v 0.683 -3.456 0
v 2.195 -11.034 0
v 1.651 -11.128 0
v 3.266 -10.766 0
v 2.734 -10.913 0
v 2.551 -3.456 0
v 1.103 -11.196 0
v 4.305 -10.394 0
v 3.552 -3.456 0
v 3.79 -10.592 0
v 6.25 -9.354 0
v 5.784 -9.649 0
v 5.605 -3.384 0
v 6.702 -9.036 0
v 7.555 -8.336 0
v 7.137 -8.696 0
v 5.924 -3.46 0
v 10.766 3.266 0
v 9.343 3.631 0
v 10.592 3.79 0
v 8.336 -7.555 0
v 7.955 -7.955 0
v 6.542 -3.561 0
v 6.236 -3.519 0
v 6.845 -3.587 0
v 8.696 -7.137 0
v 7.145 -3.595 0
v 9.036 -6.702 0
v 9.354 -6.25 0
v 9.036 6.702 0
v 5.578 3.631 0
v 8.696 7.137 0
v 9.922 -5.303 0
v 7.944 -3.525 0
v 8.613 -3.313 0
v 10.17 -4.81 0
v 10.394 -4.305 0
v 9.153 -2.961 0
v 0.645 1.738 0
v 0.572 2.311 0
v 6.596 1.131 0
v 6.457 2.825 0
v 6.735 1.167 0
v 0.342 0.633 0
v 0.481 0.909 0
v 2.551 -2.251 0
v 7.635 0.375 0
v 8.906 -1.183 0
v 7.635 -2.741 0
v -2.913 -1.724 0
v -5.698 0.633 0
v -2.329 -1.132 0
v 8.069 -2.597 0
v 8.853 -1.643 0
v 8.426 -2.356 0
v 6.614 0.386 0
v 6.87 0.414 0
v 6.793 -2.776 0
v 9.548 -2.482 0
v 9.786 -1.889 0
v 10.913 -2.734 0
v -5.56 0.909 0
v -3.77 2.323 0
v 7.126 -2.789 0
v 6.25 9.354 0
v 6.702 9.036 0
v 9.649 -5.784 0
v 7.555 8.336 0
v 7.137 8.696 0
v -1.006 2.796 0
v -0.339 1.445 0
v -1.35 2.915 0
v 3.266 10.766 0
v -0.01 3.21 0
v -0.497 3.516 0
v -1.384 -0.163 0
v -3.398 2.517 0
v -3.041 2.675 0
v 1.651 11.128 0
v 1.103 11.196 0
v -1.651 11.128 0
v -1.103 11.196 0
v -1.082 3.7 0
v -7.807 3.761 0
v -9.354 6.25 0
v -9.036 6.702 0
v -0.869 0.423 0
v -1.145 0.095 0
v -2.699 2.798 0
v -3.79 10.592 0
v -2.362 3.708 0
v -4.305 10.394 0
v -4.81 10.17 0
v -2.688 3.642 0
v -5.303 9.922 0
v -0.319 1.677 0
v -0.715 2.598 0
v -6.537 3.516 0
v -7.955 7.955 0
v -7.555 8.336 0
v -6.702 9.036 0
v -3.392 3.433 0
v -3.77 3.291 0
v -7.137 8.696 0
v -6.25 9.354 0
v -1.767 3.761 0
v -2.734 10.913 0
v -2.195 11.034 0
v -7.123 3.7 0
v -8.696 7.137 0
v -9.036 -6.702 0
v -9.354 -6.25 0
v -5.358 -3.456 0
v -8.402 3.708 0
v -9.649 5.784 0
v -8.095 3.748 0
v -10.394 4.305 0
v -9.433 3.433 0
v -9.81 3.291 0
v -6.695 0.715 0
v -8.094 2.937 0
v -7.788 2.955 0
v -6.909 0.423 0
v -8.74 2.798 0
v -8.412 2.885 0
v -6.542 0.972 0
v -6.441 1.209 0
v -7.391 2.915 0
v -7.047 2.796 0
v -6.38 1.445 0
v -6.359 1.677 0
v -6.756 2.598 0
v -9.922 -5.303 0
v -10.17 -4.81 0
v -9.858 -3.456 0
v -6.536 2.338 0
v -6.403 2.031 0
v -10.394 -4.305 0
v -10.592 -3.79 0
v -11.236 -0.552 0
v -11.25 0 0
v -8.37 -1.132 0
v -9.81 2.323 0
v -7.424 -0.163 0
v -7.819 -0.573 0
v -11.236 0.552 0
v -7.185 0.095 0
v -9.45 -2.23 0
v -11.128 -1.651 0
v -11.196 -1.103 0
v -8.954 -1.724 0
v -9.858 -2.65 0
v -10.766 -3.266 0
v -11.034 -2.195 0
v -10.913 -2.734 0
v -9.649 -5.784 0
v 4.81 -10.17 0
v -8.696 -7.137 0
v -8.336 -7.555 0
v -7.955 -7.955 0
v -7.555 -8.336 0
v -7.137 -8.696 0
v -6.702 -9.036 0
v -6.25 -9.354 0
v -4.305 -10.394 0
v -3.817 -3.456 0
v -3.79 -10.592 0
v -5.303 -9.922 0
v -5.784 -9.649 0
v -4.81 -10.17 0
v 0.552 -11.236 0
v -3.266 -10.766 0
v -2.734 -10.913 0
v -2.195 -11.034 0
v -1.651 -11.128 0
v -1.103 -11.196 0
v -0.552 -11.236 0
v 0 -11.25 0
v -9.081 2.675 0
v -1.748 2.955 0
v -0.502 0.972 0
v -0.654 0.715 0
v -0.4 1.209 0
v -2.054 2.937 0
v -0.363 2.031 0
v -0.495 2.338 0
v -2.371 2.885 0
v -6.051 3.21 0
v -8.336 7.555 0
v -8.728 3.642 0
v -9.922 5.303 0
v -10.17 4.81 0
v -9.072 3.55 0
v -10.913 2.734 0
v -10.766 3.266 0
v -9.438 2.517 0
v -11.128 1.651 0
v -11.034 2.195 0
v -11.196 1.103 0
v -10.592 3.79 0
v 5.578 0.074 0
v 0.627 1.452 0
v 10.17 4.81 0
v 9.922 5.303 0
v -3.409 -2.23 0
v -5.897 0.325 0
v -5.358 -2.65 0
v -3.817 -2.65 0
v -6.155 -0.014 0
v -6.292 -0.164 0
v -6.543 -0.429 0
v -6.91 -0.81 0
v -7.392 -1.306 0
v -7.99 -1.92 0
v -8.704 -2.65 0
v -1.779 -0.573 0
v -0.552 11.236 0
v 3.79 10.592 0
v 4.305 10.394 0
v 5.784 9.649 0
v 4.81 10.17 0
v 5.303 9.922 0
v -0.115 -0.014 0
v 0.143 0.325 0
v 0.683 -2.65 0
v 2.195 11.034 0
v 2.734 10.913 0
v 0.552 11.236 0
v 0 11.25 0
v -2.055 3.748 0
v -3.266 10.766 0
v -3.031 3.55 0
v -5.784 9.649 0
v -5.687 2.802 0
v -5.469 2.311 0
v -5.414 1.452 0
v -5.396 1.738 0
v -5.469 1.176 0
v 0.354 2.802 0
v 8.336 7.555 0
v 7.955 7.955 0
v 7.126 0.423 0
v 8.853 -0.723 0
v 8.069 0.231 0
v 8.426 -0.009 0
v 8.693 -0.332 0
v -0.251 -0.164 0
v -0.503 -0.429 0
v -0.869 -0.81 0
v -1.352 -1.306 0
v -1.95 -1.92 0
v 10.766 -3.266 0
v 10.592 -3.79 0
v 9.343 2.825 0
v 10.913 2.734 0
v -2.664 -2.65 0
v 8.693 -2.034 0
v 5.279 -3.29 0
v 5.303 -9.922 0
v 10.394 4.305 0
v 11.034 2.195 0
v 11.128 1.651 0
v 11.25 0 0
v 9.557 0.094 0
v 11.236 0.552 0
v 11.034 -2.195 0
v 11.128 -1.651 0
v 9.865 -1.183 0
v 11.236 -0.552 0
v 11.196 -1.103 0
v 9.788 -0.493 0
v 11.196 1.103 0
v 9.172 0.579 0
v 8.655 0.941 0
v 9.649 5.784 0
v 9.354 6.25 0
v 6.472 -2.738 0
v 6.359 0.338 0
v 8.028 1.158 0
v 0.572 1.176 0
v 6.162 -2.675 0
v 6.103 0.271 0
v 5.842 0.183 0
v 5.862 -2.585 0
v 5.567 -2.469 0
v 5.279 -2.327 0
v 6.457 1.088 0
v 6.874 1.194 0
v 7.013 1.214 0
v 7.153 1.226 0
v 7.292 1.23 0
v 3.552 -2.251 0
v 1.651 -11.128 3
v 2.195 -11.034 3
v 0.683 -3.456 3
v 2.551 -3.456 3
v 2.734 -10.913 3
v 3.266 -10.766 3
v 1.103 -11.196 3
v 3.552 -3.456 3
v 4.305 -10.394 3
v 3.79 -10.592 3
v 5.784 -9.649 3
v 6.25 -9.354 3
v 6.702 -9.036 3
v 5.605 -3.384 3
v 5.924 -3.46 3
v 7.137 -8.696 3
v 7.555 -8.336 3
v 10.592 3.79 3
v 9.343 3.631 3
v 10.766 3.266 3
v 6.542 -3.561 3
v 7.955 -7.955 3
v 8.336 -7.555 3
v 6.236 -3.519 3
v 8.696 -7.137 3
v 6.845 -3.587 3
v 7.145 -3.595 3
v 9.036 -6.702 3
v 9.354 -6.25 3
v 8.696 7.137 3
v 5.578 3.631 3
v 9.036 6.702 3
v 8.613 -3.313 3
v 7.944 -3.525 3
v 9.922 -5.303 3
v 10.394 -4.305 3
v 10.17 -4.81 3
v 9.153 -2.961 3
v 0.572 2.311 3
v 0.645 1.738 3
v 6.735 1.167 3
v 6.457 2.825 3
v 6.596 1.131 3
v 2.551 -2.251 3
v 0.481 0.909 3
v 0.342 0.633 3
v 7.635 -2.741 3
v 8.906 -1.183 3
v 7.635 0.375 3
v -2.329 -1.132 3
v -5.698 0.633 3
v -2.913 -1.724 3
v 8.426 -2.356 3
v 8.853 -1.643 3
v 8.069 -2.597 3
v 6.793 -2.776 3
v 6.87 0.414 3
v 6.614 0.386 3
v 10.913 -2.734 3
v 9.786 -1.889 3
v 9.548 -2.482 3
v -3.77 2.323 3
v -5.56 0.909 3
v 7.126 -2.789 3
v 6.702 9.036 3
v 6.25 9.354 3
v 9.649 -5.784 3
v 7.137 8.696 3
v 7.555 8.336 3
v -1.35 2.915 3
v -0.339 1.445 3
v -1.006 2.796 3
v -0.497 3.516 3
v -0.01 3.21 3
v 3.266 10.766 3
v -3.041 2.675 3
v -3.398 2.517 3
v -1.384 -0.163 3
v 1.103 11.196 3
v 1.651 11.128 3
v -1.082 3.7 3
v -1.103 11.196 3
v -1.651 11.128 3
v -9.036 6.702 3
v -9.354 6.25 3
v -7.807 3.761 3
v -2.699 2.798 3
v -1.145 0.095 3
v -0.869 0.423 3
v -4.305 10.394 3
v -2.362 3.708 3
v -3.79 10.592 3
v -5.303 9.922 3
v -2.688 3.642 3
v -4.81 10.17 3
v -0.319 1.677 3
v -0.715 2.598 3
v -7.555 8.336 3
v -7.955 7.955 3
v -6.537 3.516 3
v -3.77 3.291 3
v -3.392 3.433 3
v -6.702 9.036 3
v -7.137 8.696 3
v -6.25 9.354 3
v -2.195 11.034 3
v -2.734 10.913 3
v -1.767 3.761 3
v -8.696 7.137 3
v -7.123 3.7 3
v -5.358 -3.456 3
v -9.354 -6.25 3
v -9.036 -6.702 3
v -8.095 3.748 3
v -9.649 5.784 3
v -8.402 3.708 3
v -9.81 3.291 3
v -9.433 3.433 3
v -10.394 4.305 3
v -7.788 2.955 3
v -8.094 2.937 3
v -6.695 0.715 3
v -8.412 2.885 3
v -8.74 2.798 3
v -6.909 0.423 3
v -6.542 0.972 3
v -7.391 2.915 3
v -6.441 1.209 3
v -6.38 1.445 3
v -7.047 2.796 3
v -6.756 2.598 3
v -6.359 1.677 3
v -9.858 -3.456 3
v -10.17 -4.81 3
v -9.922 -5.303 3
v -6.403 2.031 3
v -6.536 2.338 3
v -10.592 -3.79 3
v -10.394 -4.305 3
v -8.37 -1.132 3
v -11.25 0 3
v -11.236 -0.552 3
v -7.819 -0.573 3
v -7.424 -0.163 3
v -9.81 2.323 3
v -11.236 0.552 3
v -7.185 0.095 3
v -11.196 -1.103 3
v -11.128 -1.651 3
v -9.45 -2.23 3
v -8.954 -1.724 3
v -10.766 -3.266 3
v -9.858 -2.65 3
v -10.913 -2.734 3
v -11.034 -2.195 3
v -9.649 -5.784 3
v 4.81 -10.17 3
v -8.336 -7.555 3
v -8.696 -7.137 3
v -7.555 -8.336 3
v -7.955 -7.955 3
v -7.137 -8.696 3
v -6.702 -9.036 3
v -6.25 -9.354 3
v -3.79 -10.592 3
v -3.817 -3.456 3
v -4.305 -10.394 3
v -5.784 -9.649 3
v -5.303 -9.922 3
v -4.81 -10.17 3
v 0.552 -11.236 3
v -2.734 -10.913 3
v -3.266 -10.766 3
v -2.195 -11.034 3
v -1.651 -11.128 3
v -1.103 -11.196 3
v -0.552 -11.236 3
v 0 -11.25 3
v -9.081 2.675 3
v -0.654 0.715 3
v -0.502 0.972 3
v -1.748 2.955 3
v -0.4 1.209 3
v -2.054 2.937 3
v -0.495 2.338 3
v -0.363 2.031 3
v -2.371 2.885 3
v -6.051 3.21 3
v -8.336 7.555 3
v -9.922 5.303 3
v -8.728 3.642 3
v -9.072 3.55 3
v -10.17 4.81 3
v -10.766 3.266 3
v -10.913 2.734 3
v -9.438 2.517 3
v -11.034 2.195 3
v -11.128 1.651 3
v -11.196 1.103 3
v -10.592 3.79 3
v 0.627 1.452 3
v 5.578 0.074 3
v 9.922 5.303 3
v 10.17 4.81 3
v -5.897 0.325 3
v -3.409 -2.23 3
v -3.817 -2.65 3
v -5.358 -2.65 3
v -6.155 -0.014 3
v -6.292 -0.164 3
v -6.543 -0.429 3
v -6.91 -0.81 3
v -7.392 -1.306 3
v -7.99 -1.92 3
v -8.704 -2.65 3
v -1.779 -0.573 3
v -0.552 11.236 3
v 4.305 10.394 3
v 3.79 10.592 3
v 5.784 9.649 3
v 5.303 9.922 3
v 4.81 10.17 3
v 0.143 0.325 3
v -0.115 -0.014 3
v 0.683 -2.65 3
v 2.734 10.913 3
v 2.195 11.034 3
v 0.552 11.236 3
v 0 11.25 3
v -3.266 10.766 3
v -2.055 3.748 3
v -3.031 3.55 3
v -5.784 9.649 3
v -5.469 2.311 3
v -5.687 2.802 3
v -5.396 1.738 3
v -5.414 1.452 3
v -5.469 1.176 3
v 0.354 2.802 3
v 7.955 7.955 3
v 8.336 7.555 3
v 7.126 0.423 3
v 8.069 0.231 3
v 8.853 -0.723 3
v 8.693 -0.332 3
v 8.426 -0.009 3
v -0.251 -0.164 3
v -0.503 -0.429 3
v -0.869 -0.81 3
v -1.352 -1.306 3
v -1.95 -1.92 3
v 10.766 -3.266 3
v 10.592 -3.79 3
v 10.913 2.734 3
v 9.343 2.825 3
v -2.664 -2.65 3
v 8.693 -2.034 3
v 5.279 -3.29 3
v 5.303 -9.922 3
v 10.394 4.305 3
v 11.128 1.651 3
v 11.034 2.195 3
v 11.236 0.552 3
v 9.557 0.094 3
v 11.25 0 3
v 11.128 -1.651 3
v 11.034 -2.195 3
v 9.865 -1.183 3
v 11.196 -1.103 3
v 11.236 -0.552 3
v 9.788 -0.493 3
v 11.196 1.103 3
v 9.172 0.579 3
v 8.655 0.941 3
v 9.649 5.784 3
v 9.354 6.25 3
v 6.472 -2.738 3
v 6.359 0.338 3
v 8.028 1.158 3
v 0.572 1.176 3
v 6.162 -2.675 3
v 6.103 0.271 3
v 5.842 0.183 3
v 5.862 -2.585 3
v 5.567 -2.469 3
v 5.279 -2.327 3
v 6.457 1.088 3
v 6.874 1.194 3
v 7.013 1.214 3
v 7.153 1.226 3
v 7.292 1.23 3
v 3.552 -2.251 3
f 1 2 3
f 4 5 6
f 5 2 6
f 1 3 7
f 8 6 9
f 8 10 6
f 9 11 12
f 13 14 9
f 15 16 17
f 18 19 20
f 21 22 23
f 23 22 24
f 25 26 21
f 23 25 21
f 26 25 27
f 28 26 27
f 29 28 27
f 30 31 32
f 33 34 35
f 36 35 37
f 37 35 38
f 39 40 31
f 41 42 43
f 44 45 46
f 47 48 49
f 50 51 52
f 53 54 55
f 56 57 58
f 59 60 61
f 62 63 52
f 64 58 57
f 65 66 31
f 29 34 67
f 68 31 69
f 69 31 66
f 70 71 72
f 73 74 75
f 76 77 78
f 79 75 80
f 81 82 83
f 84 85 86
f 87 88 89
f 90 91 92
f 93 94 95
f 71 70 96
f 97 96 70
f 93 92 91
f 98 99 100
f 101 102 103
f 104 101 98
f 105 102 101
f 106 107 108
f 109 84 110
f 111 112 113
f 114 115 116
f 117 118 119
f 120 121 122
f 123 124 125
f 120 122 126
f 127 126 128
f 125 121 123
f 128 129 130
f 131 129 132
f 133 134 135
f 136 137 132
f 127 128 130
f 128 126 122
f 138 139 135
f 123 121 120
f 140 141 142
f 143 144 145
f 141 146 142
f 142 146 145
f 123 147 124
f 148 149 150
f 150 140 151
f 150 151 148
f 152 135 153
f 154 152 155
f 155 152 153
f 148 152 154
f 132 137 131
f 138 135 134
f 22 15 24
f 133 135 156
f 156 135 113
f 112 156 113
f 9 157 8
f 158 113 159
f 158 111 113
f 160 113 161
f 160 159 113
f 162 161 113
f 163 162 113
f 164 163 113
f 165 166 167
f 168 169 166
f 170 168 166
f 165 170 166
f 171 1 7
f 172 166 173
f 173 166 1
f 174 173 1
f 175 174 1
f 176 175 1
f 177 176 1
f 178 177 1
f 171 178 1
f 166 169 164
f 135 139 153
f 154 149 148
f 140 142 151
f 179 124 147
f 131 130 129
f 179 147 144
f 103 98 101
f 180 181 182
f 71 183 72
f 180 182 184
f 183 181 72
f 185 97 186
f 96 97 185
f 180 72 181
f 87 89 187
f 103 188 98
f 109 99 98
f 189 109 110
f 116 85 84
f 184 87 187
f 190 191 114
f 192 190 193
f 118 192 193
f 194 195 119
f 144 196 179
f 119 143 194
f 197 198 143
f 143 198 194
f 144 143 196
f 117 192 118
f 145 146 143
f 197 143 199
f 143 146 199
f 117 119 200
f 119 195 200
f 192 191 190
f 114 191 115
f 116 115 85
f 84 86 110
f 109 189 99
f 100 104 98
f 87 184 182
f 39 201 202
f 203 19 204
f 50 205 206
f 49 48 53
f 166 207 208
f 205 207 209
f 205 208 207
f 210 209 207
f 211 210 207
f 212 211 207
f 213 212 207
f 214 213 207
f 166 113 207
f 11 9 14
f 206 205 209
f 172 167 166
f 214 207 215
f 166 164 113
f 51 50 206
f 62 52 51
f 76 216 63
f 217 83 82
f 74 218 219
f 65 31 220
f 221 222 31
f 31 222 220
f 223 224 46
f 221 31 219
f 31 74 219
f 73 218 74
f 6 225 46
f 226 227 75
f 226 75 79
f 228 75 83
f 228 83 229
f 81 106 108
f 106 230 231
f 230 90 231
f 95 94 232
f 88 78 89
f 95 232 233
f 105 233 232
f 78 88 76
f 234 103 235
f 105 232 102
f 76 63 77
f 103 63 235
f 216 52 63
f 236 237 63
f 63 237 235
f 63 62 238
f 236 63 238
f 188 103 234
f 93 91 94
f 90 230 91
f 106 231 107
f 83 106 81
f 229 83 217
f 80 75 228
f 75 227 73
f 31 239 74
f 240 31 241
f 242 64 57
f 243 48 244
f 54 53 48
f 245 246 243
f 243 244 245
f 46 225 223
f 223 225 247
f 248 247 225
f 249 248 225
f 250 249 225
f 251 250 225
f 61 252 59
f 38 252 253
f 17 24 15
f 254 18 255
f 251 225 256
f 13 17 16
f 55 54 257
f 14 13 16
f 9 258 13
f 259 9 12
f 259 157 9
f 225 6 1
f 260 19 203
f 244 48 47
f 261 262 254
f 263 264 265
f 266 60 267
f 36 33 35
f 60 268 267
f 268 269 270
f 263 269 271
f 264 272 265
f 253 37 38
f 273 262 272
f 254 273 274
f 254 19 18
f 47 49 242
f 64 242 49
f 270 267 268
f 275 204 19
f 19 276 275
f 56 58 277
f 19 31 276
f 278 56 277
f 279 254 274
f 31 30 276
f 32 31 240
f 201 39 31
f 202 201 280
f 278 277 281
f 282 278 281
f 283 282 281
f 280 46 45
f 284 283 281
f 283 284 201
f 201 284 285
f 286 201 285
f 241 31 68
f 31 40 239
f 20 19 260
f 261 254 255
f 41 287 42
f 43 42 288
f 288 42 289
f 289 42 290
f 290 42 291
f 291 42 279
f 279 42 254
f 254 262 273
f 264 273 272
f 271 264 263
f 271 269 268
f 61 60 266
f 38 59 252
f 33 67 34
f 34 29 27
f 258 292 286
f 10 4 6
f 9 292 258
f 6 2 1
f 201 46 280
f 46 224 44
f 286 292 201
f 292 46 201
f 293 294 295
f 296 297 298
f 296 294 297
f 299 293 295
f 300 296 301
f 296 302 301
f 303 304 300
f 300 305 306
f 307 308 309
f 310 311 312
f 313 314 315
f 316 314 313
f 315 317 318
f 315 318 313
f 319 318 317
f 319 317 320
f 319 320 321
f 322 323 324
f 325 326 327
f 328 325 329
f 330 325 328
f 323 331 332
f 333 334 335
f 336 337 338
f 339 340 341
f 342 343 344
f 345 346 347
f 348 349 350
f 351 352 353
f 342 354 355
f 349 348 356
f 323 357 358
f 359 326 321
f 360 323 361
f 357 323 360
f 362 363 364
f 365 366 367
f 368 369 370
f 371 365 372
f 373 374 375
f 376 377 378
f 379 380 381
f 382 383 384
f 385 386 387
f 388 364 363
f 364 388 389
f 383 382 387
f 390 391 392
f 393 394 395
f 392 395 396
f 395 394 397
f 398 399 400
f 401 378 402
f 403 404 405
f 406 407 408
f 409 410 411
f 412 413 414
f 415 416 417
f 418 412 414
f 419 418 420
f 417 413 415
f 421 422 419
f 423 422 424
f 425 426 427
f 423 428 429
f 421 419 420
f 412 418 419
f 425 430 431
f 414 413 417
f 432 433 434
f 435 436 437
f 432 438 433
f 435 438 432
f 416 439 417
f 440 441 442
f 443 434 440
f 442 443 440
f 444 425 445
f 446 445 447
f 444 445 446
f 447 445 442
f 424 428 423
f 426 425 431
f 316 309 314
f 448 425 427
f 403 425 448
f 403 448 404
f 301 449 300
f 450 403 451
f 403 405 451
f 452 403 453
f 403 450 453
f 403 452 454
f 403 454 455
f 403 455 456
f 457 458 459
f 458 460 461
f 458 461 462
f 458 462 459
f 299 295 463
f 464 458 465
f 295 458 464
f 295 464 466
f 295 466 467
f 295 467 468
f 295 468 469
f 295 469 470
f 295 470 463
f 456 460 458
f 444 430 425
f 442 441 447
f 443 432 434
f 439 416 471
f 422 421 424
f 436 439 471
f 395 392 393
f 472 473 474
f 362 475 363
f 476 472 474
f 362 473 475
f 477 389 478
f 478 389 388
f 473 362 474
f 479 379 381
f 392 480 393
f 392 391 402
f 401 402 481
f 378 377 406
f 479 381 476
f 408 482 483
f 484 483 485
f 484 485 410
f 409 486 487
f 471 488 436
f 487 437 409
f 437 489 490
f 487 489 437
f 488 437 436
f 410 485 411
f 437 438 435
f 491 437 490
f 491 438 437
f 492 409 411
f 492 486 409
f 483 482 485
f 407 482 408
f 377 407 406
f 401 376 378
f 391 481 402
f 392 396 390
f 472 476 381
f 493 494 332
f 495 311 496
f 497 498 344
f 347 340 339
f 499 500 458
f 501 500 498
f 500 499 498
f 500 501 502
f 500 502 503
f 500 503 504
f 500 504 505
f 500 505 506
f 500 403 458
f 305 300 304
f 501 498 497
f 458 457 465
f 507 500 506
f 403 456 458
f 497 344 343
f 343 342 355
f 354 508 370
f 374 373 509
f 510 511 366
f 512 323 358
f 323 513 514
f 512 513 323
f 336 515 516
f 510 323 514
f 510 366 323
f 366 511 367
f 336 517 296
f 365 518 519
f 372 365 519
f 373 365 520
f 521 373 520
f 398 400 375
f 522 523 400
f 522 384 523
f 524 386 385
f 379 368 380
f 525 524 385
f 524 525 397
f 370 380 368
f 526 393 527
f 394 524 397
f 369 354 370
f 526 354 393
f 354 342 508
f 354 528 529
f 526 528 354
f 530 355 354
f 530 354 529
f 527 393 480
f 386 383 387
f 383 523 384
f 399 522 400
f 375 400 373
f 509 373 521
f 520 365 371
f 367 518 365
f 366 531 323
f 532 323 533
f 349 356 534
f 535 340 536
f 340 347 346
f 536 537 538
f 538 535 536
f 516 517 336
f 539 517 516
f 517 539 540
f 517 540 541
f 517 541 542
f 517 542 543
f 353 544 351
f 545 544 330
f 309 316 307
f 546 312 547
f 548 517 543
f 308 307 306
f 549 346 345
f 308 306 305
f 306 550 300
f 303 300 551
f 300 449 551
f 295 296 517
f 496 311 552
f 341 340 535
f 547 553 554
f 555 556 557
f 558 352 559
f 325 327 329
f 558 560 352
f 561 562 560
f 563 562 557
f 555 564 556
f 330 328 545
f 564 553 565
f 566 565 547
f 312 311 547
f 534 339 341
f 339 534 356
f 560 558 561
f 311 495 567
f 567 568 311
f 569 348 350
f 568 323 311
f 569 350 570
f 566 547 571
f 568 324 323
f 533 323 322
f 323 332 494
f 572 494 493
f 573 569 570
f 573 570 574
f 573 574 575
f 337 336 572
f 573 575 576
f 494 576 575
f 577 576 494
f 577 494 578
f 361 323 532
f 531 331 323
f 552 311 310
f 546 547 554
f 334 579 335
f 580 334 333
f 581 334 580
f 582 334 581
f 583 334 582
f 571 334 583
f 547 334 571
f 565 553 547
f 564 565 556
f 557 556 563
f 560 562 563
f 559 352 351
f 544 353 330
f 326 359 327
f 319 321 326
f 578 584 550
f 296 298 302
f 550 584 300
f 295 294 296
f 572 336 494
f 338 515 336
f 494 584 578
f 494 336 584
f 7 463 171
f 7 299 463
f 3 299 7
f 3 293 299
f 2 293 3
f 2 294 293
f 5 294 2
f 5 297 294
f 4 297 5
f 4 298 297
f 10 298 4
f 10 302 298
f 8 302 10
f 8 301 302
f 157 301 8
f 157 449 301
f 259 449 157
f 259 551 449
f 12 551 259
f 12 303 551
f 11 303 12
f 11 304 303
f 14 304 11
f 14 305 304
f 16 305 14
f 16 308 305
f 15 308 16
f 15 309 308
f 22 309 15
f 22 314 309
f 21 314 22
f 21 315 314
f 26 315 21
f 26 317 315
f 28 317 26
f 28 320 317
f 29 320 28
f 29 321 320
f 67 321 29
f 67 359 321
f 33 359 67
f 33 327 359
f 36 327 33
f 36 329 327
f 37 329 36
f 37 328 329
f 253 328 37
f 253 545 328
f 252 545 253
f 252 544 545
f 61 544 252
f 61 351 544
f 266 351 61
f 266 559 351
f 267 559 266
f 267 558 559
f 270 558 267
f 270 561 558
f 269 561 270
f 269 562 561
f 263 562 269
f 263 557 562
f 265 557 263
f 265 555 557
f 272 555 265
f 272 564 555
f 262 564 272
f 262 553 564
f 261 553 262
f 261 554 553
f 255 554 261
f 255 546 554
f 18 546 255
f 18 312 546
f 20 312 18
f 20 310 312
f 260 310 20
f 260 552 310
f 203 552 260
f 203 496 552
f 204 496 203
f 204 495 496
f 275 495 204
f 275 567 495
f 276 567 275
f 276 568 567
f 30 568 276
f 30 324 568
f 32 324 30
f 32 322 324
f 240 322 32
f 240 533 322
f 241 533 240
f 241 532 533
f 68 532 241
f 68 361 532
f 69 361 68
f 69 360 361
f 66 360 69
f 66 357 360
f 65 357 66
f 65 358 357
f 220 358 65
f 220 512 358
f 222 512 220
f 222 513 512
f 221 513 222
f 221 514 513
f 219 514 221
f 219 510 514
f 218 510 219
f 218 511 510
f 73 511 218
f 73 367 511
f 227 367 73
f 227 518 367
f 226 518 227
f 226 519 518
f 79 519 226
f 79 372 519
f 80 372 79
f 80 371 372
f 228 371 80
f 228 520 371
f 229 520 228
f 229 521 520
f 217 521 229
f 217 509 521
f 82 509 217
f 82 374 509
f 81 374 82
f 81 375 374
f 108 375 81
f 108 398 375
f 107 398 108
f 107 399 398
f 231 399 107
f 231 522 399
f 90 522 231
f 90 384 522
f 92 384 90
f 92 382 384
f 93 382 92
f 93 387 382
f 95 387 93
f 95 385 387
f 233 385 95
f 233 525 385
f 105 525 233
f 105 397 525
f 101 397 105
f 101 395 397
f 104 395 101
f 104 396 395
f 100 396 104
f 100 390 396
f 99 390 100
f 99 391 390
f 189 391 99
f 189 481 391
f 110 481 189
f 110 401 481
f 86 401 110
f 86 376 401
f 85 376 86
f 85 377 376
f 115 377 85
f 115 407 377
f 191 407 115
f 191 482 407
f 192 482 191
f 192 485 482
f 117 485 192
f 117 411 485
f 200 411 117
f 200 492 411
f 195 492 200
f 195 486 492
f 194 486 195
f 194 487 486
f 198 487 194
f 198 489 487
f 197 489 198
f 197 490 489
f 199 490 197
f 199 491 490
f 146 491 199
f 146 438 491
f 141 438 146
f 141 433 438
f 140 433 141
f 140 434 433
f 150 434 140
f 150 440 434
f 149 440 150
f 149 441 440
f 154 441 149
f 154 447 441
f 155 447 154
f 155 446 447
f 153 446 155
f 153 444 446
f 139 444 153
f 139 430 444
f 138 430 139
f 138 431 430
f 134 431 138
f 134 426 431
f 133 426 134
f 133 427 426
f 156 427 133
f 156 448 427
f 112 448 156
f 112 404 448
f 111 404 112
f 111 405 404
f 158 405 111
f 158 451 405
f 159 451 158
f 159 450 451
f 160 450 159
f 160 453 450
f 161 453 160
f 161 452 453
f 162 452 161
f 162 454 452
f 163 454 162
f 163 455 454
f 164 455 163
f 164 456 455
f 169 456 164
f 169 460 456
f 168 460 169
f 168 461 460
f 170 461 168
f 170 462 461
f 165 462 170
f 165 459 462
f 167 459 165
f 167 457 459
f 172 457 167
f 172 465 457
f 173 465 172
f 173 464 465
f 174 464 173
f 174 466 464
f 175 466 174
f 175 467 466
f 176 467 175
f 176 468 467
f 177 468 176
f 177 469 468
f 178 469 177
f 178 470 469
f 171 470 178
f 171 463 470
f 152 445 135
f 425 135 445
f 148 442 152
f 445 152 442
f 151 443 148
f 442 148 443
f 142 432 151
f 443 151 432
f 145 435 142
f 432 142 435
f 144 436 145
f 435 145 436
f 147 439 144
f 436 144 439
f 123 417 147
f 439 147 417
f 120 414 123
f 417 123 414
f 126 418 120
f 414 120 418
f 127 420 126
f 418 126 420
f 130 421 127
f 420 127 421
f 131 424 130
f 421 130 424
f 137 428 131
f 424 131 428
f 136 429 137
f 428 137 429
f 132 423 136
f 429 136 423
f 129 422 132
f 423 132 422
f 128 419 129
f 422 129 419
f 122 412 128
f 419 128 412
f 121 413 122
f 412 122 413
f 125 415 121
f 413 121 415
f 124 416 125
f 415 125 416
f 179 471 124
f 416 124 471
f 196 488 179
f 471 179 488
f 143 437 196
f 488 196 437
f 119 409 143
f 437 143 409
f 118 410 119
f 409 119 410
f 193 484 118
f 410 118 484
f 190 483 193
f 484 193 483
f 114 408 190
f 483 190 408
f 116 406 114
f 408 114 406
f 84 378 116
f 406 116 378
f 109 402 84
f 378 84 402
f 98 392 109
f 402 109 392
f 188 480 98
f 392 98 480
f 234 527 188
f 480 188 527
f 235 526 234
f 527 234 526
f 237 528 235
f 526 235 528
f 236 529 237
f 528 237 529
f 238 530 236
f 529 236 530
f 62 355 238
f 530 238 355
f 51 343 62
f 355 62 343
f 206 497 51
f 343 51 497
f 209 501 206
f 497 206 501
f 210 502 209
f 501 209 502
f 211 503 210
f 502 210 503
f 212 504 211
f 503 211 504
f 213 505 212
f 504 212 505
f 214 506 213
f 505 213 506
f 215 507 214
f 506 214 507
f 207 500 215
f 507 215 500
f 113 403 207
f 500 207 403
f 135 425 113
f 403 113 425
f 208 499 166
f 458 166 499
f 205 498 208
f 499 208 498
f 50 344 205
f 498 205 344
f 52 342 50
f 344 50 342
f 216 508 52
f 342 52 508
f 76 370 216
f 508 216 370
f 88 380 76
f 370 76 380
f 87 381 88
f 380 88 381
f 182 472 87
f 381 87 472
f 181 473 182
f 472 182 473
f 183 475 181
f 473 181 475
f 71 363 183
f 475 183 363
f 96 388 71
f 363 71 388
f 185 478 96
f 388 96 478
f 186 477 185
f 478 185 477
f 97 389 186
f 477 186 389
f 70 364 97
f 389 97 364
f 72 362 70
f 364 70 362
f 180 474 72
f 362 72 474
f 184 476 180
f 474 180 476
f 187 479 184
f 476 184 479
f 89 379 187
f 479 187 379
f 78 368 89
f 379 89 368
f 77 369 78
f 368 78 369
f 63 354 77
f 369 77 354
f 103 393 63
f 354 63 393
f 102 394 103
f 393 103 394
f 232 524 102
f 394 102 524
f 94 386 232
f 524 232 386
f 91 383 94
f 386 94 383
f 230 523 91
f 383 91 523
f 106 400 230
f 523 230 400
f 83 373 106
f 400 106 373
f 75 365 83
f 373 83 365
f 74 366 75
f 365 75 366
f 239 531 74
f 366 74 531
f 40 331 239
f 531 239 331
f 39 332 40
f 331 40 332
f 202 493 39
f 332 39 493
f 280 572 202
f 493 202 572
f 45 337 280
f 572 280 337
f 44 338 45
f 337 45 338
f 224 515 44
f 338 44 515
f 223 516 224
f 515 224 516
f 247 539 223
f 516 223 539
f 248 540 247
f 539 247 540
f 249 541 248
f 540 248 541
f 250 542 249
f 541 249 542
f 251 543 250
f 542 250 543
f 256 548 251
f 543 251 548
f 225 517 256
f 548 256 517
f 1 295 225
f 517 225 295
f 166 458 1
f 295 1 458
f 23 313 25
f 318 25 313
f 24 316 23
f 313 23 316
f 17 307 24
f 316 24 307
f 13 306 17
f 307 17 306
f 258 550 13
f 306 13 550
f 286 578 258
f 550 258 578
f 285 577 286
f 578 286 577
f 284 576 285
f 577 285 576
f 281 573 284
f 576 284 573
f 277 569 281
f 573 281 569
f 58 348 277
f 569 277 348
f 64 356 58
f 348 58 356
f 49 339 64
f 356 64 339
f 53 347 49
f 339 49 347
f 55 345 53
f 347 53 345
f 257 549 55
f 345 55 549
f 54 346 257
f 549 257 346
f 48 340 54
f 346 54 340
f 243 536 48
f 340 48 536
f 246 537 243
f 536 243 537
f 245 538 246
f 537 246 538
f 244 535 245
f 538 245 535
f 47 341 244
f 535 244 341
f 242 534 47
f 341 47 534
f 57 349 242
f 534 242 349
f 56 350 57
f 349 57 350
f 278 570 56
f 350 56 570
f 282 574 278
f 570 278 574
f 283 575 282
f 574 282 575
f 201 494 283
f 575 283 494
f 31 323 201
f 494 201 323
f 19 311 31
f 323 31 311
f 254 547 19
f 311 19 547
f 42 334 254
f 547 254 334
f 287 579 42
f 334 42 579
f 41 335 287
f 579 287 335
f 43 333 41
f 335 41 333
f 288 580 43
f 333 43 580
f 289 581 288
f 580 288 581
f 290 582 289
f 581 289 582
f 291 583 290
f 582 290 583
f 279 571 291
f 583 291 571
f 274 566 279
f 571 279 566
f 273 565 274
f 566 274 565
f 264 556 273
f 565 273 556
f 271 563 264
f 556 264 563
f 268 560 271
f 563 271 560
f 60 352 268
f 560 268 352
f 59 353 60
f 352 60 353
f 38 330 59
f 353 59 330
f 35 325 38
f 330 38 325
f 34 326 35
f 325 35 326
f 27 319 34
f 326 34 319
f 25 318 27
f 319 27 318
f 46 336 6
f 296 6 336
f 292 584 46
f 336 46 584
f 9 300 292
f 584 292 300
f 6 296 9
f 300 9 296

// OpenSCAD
d = 22.5;

linear_extrude(3)
difference()
{
    circle(d=d, $fn=128);
    text(str(d), size = 7, font = "David", halign="center", valign="center");
}
